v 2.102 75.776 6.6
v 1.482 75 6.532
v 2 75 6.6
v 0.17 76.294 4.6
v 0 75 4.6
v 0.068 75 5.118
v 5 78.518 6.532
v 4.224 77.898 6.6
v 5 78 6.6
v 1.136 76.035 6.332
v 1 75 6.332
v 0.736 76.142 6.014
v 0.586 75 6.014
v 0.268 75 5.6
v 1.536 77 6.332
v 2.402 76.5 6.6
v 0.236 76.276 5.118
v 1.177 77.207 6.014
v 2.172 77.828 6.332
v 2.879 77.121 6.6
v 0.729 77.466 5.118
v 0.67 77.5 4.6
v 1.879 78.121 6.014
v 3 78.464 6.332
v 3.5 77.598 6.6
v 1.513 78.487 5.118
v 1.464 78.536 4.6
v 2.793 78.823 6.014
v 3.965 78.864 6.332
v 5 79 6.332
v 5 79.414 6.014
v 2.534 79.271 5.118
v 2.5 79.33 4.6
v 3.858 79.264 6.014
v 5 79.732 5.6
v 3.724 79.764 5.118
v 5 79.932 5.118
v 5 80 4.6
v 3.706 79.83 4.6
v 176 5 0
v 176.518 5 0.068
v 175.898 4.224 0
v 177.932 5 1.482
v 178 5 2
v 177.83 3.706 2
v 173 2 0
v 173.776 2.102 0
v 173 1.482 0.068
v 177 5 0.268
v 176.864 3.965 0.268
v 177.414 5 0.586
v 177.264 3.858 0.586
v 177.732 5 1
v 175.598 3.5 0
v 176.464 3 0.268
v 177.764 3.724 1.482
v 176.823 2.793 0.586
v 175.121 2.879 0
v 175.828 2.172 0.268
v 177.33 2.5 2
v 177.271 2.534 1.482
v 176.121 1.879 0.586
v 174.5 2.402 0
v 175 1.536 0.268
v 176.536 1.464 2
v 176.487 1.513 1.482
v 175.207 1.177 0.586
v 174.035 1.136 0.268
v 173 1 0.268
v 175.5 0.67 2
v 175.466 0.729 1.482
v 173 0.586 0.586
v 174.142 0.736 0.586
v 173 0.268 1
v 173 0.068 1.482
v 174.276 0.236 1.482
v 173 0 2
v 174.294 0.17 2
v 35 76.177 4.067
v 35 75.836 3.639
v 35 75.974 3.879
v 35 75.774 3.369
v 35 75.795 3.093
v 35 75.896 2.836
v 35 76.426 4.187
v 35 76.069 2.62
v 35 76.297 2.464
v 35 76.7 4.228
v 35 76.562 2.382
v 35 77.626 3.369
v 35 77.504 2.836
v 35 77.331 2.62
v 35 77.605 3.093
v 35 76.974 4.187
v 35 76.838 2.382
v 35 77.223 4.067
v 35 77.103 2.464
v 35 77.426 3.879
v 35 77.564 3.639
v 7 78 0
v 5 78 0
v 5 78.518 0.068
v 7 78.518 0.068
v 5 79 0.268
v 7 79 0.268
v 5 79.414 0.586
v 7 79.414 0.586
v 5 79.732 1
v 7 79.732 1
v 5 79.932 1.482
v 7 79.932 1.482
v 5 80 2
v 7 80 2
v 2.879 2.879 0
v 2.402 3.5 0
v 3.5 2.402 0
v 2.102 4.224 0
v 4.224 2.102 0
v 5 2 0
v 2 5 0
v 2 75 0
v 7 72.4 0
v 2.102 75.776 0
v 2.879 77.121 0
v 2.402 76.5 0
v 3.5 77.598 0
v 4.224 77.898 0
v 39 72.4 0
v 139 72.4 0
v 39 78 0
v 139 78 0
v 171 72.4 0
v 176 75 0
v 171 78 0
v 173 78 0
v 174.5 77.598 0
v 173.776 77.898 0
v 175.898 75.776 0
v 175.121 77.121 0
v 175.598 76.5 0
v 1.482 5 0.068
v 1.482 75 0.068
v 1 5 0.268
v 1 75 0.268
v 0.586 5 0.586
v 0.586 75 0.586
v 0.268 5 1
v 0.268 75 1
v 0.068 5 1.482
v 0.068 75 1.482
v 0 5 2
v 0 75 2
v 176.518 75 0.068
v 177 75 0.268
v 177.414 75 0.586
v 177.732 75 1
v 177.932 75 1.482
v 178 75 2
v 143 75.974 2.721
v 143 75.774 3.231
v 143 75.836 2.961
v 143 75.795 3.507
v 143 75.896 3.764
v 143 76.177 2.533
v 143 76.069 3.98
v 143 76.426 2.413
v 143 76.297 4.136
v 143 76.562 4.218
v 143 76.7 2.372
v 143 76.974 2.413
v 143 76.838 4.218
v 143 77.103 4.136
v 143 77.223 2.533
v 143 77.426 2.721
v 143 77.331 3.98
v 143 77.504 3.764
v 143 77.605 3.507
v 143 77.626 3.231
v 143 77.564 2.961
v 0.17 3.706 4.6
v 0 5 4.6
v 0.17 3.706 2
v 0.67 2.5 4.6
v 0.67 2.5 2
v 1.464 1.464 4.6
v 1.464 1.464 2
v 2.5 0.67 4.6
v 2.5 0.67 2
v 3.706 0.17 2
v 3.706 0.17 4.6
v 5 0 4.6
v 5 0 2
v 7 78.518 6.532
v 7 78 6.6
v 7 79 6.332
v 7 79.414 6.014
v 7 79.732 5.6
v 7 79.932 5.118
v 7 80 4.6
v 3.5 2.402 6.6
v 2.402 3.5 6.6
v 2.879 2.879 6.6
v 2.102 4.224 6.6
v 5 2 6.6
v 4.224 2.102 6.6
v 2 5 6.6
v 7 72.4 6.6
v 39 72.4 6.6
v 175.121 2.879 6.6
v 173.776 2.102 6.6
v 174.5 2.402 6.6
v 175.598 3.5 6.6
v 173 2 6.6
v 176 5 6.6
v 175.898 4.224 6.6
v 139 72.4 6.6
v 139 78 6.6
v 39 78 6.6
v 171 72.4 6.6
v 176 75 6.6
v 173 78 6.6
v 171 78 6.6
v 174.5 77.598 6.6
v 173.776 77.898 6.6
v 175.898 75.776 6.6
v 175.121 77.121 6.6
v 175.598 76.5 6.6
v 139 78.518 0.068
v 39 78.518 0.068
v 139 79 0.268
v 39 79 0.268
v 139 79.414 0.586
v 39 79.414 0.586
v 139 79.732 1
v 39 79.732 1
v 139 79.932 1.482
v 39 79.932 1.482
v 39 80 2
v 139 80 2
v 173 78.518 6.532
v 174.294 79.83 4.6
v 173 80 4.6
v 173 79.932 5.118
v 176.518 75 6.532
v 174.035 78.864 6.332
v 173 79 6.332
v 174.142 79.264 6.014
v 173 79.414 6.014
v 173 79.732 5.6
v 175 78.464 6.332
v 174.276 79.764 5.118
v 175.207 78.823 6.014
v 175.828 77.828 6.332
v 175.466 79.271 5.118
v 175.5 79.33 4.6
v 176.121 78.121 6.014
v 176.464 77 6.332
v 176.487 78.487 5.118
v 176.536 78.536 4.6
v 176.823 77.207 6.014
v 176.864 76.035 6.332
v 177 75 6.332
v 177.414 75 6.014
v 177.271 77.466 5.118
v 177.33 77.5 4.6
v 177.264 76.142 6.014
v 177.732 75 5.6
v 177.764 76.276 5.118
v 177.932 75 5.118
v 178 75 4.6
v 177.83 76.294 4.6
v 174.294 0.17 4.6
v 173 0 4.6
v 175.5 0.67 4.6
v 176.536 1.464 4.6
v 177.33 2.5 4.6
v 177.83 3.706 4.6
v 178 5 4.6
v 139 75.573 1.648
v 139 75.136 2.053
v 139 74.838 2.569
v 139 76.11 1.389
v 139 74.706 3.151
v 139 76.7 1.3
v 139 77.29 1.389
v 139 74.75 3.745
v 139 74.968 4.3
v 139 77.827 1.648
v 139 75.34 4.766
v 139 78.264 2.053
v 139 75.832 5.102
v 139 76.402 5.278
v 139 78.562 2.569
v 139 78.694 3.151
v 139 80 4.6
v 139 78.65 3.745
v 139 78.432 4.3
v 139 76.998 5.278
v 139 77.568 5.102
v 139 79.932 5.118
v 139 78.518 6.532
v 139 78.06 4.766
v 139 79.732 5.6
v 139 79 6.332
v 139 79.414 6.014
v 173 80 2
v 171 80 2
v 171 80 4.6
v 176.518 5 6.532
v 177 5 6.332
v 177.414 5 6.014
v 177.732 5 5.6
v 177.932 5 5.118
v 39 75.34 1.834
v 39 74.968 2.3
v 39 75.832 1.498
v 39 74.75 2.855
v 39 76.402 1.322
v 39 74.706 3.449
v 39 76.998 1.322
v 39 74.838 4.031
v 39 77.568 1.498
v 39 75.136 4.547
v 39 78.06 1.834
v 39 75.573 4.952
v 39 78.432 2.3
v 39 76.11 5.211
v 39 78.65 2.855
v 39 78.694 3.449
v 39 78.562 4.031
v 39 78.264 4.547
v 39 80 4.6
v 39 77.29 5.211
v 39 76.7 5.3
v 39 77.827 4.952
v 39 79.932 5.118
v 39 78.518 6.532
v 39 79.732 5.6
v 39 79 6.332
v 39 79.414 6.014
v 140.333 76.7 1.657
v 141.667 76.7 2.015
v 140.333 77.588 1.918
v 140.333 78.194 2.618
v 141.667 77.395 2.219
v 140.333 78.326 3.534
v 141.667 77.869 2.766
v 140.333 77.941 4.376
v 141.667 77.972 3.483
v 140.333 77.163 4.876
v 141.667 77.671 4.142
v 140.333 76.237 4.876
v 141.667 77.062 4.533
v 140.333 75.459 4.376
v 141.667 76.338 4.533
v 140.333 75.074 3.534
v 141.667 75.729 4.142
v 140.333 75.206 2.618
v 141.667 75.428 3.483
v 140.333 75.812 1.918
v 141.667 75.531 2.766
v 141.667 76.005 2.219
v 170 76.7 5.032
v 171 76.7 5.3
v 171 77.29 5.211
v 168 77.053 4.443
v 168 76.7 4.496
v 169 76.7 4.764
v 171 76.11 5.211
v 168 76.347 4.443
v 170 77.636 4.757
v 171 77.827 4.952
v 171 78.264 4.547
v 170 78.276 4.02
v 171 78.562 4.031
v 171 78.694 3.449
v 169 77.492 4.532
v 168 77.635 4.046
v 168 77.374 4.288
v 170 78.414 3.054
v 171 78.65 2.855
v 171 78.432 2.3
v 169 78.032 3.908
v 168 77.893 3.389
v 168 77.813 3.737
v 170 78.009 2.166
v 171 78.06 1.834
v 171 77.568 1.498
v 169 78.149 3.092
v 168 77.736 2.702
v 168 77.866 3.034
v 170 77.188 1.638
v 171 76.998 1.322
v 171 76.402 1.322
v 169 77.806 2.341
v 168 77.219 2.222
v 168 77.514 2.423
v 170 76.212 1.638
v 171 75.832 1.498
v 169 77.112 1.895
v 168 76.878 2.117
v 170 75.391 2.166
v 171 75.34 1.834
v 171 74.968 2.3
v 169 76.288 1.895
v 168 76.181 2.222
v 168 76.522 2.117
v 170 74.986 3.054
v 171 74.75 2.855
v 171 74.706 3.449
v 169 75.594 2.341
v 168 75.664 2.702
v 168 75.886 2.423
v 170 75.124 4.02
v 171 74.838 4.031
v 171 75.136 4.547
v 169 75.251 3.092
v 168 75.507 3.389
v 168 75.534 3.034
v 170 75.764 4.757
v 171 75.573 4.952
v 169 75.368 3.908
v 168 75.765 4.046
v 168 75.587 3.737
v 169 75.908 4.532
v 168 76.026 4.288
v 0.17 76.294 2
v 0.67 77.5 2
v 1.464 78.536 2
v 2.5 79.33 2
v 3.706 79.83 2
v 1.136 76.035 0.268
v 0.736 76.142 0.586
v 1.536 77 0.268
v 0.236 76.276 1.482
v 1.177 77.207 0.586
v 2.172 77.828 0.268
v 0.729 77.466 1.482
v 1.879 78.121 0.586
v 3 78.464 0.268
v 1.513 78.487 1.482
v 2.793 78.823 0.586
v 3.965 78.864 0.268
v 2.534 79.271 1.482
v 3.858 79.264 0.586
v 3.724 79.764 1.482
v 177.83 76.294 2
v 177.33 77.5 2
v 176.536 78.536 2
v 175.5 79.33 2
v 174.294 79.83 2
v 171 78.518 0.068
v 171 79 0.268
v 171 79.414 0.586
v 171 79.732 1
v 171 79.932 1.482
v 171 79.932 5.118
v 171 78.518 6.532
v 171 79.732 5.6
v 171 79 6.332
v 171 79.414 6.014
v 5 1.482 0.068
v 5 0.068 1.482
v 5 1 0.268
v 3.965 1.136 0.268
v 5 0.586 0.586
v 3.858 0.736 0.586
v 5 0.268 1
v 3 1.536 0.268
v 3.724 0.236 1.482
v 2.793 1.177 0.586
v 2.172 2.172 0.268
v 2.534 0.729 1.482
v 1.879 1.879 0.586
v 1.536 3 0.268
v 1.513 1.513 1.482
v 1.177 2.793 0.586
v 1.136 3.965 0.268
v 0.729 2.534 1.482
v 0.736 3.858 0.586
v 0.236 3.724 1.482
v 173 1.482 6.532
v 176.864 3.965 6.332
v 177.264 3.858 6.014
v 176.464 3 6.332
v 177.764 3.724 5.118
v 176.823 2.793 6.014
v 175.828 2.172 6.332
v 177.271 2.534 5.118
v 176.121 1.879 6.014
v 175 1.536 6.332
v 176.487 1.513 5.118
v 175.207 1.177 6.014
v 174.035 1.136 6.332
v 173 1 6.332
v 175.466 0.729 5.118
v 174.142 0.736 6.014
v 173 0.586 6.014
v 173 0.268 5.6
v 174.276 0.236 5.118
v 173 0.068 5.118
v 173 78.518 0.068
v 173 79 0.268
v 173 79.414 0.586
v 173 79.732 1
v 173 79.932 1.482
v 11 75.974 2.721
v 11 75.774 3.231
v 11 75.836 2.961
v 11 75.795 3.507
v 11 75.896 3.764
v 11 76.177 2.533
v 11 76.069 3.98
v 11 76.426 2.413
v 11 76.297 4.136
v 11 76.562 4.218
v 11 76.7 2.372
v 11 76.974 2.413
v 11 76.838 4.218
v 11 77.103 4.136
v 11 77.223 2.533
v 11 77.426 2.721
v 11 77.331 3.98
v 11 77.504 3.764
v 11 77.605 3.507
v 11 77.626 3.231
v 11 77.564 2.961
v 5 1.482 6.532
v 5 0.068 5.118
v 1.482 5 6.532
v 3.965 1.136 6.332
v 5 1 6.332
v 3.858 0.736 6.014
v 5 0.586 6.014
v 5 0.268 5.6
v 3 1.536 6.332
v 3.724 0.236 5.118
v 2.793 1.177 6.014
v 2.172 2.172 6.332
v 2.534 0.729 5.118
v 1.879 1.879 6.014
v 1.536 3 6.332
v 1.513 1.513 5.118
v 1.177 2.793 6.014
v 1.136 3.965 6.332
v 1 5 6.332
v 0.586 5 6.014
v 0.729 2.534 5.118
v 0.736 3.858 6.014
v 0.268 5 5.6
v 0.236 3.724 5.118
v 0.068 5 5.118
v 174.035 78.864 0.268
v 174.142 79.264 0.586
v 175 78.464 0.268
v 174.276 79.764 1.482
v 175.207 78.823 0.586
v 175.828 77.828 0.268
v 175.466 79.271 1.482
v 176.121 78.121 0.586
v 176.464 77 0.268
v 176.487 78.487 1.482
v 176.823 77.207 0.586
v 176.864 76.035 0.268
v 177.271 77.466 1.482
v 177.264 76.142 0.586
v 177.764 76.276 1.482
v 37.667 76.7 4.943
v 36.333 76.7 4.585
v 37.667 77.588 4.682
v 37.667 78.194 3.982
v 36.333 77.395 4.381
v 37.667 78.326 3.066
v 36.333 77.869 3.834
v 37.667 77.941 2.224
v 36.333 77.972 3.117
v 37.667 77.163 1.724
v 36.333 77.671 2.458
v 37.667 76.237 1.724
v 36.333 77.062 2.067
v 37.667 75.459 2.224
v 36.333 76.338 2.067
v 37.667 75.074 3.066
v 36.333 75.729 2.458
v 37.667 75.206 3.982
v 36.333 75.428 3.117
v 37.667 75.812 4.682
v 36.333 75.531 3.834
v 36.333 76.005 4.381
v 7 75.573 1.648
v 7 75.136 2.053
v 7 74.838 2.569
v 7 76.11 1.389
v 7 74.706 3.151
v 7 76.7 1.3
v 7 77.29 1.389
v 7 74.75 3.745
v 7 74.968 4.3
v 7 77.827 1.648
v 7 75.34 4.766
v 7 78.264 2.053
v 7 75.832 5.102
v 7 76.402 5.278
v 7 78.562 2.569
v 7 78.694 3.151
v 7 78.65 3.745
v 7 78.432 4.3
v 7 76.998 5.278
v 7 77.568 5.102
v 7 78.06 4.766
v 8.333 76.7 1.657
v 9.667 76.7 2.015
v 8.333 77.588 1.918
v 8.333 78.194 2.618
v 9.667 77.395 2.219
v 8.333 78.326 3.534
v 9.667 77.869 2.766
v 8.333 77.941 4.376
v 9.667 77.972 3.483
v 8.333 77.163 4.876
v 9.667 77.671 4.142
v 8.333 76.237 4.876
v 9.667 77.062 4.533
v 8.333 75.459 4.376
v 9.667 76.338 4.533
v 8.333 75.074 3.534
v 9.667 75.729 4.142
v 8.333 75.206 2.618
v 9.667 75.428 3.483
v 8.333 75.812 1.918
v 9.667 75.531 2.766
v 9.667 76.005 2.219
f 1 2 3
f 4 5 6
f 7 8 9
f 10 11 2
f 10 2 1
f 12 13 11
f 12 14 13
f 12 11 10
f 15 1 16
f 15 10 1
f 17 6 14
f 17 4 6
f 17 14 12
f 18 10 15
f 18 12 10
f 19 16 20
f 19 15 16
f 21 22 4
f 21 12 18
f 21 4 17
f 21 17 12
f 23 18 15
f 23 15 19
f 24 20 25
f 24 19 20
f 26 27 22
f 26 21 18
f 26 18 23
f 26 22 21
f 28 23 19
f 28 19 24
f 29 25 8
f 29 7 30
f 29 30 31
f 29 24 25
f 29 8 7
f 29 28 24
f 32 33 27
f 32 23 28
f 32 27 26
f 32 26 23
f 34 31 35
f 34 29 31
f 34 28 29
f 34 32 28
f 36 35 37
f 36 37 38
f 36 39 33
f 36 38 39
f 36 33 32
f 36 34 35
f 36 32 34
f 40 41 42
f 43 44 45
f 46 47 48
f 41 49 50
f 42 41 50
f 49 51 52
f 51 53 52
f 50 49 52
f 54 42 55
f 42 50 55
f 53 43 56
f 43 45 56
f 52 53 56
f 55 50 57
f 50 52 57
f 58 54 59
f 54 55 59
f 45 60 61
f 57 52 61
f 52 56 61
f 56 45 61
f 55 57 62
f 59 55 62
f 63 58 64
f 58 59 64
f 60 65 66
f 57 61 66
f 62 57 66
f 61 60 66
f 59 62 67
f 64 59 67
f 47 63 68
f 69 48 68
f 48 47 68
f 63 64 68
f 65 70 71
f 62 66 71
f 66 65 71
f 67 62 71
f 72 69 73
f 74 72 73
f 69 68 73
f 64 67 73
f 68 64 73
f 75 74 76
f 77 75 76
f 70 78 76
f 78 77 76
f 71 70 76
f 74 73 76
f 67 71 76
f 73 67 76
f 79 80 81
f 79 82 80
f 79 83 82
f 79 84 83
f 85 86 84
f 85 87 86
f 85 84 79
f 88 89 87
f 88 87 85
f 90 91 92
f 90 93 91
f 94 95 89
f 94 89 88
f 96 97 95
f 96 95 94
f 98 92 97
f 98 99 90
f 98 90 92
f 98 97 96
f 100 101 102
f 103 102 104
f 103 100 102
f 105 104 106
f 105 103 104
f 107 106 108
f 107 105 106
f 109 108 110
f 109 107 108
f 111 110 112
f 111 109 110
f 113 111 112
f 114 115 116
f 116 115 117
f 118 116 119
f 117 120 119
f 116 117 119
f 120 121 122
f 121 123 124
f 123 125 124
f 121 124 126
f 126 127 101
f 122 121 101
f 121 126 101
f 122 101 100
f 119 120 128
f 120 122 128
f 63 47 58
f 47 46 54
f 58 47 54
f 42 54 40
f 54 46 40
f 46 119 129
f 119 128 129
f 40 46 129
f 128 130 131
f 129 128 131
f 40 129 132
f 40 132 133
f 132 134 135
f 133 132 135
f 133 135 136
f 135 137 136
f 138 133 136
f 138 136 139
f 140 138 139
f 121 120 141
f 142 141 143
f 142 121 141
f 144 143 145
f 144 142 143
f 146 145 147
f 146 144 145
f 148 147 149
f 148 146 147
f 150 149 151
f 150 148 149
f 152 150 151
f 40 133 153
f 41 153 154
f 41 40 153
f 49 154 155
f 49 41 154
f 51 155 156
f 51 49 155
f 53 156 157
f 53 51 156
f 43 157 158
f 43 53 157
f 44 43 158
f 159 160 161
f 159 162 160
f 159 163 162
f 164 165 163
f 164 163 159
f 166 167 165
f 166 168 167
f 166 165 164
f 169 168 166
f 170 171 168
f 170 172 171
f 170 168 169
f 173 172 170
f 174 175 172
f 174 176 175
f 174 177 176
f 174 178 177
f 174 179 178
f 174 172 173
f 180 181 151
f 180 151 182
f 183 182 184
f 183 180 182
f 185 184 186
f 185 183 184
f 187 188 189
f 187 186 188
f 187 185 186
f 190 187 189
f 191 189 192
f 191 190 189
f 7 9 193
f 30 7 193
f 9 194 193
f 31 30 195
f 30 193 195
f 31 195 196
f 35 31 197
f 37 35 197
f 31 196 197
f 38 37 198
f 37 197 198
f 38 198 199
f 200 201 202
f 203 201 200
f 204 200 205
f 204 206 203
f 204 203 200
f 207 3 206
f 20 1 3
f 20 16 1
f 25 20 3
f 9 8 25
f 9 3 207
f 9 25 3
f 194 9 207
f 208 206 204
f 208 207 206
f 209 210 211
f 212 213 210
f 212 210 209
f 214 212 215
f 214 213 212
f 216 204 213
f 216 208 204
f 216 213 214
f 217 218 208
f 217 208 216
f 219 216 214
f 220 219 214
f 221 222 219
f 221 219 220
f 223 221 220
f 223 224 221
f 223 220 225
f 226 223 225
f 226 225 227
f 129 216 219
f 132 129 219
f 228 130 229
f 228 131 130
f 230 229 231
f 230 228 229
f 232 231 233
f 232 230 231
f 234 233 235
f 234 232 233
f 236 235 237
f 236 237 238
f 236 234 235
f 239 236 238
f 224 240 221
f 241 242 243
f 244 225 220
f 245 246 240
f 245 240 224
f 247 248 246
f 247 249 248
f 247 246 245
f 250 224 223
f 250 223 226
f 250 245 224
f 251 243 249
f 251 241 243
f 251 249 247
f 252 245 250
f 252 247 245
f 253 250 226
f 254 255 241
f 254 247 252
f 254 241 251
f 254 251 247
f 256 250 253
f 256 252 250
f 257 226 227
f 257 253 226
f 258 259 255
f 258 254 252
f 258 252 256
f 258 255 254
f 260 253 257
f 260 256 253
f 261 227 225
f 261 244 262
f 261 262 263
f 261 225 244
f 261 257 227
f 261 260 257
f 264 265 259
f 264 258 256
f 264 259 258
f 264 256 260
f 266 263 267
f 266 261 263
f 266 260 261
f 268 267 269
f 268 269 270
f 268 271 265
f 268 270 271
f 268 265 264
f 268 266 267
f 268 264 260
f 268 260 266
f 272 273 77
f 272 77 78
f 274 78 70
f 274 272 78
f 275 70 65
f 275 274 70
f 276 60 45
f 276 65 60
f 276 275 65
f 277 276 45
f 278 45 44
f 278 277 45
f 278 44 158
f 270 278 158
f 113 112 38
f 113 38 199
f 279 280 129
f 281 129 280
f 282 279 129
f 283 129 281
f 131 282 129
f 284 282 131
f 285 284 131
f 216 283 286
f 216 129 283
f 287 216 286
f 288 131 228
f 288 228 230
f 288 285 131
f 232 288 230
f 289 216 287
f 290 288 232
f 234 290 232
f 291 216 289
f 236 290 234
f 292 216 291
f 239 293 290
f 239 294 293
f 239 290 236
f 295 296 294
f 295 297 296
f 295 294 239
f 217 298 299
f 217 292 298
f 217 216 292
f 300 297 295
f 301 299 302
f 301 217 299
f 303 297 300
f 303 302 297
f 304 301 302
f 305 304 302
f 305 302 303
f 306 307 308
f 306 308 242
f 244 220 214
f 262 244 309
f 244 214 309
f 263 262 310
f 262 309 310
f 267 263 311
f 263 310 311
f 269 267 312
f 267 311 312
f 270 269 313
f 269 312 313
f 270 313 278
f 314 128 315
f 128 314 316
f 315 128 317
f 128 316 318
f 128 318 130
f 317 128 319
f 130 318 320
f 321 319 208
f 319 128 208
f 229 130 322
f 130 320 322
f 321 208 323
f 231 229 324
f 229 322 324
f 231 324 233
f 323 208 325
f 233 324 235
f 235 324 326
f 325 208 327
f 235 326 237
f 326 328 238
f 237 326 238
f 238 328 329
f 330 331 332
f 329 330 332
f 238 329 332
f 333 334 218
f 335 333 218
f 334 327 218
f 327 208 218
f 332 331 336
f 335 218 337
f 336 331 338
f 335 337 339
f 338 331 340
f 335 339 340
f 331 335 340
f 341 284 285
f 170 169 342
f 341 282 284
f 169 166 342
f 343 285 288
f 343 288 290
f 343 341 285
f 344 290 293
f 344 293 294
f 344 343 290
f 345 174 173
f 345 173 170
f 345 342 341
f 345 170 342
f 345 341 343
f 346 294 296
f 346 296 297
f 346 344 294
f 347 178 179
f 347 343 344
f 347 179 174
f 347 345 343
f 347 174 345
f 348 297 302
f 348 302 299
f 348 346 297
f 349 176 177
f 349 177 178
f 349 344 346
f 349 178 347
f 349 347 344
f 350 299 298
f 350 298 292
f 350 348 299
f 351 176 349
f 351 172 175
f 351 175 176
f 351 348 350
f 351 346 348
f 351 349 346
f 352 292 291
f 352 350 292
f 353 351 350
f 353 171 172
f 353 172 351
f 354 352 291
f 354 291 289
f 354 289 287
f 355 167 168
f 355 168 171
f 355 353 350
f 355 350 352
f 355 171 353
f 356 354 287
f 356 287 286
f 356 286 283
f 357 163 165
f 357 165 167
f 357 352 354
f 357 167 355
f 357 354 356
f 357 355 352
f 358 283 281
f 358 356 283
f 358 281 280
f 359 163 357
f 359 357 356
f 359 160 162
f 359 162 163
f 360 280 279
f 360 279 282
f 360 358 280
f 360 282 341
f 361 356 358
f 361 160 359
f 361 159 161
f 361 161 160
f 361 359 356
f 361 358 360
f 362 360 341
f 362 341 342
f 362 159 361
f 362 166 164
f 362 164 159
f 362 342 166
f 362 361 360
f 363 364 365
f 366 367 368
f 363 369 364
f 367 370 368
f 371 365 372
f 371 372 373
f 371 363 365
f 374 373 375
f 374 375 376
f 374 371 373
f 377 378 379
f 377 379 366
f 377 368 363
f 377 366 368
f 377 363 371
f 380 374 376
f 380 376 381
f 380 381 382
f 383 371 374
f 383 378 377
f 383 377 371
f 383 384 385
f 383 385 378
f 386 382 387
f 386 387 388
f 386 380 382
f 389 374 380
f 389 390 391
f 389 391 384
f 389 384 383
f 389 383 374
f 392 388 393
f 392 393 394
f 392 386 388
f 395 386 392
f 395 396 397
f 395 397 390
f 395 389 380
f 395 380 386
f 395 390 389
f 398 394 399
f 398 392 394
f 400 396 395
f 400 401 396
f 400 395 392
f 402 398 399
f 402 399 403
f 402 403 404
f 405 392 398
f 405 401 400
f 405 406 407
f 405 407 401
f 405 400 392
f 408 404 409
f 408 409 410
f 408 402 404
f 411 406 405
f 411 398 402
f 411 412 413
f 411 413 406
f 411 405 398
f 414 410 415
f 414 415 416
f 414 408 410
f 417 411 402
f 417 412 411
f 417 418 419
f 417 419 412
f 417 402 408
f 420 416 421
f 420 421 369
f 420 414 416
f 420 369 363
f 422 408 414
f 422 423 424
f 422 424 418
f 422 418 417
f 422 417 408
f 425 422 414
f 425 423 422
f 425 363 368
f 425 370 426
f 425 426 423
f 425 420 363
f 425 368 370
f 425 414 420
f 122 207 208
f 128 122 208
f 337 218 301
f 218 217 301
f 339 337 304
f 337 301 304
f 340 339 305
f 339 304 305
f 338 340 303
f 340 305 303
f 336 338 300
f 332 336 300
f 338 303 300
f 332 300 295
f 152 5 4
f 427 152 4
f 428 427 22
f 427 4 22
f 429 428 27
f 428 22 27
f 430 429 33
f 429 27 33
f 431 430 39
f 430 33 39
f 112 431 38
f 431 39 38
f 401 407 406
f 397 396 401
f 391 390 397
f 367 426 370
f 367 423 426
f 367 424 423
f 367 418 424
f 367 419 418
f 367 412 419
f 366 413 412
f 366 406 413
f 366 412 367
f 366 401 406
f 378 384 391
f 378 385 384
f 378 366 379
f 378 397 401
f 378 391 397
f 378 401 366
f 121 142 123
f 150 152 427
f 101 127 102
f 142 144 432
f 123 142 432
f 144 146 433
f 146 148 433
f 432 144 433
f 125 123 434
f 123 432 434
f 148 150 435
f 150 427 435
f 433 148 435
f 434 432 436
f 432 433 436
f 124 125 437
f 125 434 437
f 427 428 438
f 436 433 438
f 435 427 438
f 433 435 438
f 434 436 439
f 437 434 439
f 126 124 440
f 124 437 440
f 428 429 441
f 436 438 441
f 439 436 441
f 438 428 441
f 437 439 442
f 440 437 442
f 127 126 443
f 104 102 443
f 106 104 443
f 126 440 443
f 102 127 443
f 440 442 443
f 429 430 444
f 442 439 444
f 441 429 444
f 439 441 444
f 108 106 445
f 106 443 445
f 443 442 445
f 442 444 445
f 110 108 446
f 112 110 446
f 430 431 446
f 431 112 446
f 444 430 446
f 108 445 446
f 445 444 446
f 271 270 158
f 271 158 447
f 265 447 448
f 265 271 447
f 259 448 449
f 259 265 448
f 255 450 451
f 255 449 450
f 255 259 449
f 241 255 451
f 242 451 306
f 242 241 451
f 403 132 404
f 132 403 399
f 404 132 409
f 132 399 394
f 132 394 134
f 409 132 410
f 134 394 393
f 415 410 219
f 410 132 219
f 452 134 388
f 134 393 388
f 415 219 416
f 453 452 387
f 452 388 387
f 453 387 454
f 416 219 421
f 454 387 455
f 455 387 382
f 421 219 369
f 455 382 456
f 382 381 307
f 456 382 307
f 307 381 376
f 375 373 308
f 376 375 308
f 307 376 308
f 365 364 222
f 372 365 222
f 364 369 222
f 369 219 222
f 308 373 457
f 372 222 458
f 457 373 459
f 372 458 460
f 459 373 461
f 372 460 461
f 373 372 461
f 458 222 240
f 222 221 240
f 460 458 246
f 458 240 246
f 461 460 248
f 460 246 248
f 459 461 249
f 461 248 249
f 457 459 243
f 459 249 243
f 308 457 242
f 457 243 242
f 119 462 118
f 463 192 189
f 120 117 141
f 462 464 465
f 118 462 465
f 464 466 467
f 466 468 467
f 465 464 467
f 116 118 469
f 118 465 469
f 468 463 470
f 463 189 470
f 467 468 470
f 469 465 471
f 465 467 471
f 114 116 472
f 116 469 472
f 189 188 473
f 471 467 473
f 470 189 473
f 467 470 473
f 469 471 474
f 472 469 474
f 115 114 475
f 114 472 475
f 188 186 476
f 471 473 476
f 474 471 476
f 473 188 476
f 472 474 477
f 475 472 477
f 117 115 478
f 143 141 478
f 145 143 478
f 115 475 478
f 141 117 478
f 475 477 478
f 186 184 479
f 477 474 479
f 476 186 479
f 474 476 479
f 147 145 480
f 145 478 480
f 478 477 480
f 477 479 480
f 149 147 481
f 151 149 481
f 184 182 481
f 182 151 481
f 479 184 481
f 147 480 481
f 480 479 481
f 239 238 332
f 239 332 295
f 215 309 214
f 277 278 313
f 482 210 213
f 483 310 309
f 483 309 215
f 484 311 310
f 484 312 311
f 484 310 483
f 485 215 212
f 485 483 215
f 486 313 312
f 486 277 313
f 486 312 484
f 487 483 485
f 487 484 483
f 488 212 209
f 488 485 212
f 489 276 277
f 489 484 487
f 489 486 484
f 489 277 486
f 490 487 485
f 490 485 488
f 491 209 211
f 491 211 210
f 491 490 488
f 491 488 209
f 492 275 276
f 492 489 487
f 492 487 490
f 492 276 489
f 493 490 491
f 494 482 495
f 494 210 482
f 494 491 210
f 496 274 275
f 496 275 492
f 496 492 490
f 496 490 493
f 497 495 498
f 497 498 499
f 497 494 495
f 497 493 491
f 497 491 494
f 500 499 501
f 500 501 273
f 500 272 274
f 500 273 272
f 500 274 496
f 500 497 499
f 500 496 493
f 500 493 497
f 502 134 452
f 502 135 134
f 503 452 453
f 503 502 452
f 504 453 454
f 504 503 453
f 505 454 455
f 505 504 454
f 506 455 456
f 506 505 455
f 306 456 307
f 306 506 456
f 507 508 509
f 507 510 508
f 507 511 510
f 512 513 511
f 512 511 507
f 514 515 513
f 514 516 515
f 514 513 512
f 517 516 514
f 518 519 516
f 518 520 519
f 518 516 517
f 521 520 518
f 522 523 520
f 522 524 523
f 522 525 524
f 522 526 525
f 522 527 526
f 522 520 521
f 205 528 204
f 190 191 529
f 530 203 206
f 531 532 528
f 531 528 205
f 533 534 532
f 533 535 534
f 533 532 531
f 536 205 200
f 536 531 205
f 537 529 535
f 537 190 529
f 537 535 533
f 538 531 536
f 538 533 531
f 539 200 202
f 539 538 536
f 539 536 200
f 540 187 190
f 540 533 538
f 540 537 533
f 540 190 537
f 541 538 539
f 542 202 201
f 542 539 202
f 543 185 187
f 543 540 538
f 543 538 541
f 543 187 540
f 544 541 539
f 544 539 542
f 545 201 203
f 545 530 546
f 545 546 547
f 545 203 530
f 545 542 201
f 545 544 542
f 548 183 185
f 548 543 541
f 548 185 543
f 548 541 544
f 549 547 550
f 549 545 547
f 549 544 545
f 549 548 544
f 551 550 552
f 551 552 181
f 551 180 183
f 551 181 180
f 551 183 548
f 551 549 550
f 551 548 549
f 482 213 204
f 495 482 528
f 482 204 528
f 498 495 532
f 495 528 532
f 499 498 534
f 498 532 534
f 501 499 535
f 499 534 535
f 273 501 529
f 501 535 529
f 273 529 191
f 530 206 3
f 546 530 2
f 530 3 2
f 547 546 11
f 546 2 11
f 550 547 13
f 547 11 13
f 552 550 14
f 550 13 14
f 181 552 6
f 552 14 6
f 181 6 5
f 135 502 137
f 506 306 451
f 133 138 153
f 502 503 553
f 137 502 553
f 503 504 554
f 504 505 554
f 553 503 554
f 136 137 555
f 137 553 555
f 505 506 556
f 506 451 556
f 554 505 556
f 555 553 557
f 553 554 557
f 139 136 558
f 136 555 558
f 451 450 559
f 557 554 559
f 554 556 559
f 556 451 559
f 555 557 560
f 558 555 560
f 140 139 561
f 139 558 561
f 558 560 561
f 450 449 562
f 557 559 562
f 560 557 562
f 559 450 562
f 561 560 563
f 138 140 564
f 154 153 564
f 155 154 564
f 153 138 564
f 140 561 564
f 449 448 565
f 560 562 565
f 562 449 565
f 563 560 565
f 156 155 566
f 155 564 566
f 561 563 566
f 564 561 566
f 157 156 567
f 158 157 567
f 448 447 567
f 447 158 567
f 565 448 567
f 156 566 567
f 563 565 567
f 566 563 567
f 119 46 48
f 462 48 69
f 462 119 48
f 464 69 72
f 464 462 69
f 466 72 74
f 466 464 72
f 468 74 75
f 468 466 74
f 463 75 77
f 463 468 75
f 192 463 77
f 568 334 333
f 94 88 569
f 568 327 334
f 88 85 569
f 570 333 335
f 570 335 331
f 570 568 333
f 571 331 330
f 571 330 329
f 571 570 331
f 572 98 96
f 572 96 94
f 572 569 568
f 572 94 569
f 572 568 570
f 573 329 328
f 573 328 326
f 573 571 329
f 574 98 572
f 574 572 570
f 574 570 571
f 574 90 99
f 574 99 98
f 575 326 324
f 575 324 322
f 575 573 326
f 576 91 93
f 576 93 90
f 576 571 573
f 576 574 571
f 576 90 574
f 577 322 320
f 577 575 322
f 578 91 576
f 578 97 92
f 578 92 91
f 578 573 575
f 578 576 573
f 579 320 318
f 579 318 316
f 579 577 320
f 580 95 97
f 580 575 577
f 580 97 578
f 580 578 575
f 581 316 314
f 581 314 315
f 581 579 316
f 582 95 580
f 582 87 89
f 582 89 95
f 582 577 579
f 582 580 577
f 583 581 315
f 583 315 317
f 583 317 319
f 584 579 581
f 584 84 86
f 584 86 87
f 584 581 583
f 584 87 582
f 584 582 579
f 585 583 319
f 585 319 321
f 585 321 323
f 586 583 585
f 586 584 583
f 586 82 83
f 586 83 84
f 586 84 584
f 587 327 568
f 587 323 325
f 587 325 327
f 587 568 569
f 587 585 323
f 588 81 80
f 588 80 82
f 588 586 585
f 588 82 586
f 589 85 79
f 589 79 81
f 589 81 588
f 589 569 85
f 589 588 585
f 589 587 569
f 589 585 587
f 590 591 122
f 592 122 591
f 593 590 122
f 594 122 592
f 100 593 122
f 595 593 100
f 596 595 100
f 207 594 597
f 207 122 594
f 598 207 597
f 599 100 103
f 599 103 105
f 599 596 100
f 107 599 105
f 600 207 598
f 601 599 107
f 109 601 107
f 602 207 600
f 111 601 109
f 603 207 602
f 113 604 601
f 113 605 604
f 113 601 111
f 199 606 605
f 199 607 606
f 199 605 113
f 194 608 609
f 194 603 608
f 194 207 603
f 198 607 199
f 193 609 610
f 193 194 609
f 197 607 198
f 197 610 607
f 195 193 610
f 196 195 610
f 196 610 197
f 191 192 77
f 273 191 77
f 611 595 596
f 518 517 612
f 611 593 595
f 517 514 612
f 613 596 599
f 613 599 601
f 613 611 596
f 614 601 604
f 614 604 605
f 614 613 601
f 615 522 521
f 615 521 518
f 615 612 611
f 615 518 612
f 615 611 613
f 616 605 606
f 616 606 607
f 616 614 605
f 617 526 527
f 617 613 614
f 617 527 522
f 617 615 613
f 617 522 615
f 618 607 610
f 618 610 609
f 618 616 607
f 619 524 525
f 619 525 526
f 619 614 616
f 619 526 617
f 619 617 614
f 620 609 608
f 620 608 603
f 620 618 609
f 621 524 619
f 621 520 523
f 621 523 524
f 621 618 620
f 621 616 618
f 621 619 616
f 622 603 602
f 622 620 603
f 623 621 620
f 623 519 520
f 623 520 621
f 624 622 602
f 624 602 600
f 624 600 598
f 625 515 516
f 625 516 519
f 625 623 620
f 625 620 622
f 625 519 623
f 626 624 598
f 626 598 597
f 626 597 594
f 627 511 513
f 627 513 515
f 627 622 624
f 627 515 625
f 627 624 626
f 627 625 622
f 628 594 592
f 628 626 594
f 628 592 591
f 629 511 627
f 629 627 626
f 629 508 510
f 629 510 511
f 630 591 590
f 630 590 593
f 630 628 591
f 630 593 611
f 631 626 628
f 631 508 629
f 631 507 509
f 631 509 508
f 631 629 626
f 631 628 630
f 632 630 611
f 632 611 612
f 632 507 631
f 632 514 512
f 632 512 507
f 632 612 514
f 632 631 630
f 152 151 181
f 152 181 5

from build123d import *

# Parameters (mm, degrees)
SKETCH1_W           = 178
SKETCH1_H           = 80
BOSS_EXTRUDE1_DEPTH = 6.6
FILLET1_R           = 5
SKETCH5_W           = 32
SKETCH5_H           = 7.6
CUT_EXTRUDE1_DEPTH  = 6.6
SKETCH13_R          = 2
BOSS_EXTRUDE2_DEPTH = 4
BOSS_EXTRUDE2_TAPER = 15
SKETCH10_R          = 2
BOSS_EXTRUDE5_DEPTH = 4
BOSS_EXTRUDE5_TAPER = 15
SKETCH9_R           = 2
BOSS_EXTRUDE6_DEPTH = 4
BOSS_EXTRUDE6_TAPER = 15
SKETCH6_R           = 2
BOSS_EXTRUDE9_DEPTH = 3
BOSS_EXTRUDE9_TAPER = 15
ZAOBLIT4_R          = 2


with BuildPart() as part:
    # Sketch1 → Boss-Extrude1 (new body)
    with BuildSketch(Plane.XY):
        with Locations((89, 40)):
            Rectangle(SKETCH1_W, SKETCH1_H)
    extrude(amount=BOSS_EXTRUDE1_DEPTH)

    # Fillet1
    fillet1_edges = [part.edges().sort_by_distance(p)[0] for p in [
        (0, 80, 3.3),
        (178, 80, 3.3),
        (178, 0, 3.3),
        (0, 0, 3.3),
    ]]
    fillet(fillet1_edges, radius=FILLET1_R)

    # Sketch5 → Cut-Extrude1 (cut)
    with BuildSketch(Plane.XY.offset(6.6)):
        with Locations((23, 76.2)):
            Rectangle(SKETCH5_W, SKETCH5_H)
        with Locations((155, 76.2)):
            Rectangle(SKETCH5_W, SKETCH5_H)
    extrude(amount=-CUT_EXTRUDE1_DEPTH, mode=Mode.SUBTRACT)

    # Sketch13 → Boss-Extrude2 (add)
    with BuildSketch(Plane(origin=(139, 0, 0), x_dir=(0, 0, -1), z_dir=(1, 0, 0))):
        with Locations((-3.3, 76.7)):
            Circle(SKETCH13_R)
    extrude(amount=BOSS_EXTRUDE2_DEPTH, taper=BOSS_EXTRUDE2_TAPER)

    # Sketch10 → Boss-Extrude5 (add)
    with BuildSketch(Plane(origin=(7, 0, 0), x_dir=(0, 0, -1), z_dir=(1, 0, 0))):
        with Locations((-3.3, 76.7)):
            Circle(SKETCH10_R)
    extrude(amount=BOSS_EXTRUDE5_DEPTH, taper=BOSS_EXTRUDE5_TAPER)

    # Sketch9 → Boss-Extrude6 (add)
    with BuildSketch(Plane.ZY.offset(-39)):
        with Locations((3.3, 76.7)):
            Circle(SKETCH9_R)
    extrude(amount=BOSS_EXTRUDE6_DEPTH, taper=BOSS_EXTRUDE6_TAPER)

    # Sketch6 → Boss-Extrude9 (add)
    with BuildSketch(Plane.ZY.offset(-171)):
        with Locations((3.3, 76.7)):
            Circle(SKETCH6_R)
    extrude(amount=BOSS_EXTRUDE9_DEPTH, taper=BOSS_EXTRUDE9_TAPER)

    # Zaoblit4
    zaoblit4_edges = [part.edges().sort_by_distance(p)[0] for p in [
        (172, 80, 0),
        (172, 80, 6.6),
        (0, 40, 0),
        (178, 40, 0),
        (89, 0, 0),
        (1.464466094, 1.464466094, 0),
        (176.535533906, 1.464466094, 0),
        (1.464466094, 78.535533906, 0),
        (176.535533906, 78.535533906, 0),
        (178, 40, 6.6),
        (0, 40, 6.6),
        (89, 0, 6.6),
        (1.464466094, 1.464466094, 6.6),
        (176.535533906, 1.464466094, 6.6),
        (1.464466094, 78.535533906, 6.6),
        (176.535533906, 78.535533906, 6.6),
        (89, 80, 0),
        (6, 80, 0),
        (89, 80, 6.6),
        (6, 80, 6.6),
    ]]
    fillet(zaoblit4_edges, radius=ZAOBLIT4_R)


solid = part.part
